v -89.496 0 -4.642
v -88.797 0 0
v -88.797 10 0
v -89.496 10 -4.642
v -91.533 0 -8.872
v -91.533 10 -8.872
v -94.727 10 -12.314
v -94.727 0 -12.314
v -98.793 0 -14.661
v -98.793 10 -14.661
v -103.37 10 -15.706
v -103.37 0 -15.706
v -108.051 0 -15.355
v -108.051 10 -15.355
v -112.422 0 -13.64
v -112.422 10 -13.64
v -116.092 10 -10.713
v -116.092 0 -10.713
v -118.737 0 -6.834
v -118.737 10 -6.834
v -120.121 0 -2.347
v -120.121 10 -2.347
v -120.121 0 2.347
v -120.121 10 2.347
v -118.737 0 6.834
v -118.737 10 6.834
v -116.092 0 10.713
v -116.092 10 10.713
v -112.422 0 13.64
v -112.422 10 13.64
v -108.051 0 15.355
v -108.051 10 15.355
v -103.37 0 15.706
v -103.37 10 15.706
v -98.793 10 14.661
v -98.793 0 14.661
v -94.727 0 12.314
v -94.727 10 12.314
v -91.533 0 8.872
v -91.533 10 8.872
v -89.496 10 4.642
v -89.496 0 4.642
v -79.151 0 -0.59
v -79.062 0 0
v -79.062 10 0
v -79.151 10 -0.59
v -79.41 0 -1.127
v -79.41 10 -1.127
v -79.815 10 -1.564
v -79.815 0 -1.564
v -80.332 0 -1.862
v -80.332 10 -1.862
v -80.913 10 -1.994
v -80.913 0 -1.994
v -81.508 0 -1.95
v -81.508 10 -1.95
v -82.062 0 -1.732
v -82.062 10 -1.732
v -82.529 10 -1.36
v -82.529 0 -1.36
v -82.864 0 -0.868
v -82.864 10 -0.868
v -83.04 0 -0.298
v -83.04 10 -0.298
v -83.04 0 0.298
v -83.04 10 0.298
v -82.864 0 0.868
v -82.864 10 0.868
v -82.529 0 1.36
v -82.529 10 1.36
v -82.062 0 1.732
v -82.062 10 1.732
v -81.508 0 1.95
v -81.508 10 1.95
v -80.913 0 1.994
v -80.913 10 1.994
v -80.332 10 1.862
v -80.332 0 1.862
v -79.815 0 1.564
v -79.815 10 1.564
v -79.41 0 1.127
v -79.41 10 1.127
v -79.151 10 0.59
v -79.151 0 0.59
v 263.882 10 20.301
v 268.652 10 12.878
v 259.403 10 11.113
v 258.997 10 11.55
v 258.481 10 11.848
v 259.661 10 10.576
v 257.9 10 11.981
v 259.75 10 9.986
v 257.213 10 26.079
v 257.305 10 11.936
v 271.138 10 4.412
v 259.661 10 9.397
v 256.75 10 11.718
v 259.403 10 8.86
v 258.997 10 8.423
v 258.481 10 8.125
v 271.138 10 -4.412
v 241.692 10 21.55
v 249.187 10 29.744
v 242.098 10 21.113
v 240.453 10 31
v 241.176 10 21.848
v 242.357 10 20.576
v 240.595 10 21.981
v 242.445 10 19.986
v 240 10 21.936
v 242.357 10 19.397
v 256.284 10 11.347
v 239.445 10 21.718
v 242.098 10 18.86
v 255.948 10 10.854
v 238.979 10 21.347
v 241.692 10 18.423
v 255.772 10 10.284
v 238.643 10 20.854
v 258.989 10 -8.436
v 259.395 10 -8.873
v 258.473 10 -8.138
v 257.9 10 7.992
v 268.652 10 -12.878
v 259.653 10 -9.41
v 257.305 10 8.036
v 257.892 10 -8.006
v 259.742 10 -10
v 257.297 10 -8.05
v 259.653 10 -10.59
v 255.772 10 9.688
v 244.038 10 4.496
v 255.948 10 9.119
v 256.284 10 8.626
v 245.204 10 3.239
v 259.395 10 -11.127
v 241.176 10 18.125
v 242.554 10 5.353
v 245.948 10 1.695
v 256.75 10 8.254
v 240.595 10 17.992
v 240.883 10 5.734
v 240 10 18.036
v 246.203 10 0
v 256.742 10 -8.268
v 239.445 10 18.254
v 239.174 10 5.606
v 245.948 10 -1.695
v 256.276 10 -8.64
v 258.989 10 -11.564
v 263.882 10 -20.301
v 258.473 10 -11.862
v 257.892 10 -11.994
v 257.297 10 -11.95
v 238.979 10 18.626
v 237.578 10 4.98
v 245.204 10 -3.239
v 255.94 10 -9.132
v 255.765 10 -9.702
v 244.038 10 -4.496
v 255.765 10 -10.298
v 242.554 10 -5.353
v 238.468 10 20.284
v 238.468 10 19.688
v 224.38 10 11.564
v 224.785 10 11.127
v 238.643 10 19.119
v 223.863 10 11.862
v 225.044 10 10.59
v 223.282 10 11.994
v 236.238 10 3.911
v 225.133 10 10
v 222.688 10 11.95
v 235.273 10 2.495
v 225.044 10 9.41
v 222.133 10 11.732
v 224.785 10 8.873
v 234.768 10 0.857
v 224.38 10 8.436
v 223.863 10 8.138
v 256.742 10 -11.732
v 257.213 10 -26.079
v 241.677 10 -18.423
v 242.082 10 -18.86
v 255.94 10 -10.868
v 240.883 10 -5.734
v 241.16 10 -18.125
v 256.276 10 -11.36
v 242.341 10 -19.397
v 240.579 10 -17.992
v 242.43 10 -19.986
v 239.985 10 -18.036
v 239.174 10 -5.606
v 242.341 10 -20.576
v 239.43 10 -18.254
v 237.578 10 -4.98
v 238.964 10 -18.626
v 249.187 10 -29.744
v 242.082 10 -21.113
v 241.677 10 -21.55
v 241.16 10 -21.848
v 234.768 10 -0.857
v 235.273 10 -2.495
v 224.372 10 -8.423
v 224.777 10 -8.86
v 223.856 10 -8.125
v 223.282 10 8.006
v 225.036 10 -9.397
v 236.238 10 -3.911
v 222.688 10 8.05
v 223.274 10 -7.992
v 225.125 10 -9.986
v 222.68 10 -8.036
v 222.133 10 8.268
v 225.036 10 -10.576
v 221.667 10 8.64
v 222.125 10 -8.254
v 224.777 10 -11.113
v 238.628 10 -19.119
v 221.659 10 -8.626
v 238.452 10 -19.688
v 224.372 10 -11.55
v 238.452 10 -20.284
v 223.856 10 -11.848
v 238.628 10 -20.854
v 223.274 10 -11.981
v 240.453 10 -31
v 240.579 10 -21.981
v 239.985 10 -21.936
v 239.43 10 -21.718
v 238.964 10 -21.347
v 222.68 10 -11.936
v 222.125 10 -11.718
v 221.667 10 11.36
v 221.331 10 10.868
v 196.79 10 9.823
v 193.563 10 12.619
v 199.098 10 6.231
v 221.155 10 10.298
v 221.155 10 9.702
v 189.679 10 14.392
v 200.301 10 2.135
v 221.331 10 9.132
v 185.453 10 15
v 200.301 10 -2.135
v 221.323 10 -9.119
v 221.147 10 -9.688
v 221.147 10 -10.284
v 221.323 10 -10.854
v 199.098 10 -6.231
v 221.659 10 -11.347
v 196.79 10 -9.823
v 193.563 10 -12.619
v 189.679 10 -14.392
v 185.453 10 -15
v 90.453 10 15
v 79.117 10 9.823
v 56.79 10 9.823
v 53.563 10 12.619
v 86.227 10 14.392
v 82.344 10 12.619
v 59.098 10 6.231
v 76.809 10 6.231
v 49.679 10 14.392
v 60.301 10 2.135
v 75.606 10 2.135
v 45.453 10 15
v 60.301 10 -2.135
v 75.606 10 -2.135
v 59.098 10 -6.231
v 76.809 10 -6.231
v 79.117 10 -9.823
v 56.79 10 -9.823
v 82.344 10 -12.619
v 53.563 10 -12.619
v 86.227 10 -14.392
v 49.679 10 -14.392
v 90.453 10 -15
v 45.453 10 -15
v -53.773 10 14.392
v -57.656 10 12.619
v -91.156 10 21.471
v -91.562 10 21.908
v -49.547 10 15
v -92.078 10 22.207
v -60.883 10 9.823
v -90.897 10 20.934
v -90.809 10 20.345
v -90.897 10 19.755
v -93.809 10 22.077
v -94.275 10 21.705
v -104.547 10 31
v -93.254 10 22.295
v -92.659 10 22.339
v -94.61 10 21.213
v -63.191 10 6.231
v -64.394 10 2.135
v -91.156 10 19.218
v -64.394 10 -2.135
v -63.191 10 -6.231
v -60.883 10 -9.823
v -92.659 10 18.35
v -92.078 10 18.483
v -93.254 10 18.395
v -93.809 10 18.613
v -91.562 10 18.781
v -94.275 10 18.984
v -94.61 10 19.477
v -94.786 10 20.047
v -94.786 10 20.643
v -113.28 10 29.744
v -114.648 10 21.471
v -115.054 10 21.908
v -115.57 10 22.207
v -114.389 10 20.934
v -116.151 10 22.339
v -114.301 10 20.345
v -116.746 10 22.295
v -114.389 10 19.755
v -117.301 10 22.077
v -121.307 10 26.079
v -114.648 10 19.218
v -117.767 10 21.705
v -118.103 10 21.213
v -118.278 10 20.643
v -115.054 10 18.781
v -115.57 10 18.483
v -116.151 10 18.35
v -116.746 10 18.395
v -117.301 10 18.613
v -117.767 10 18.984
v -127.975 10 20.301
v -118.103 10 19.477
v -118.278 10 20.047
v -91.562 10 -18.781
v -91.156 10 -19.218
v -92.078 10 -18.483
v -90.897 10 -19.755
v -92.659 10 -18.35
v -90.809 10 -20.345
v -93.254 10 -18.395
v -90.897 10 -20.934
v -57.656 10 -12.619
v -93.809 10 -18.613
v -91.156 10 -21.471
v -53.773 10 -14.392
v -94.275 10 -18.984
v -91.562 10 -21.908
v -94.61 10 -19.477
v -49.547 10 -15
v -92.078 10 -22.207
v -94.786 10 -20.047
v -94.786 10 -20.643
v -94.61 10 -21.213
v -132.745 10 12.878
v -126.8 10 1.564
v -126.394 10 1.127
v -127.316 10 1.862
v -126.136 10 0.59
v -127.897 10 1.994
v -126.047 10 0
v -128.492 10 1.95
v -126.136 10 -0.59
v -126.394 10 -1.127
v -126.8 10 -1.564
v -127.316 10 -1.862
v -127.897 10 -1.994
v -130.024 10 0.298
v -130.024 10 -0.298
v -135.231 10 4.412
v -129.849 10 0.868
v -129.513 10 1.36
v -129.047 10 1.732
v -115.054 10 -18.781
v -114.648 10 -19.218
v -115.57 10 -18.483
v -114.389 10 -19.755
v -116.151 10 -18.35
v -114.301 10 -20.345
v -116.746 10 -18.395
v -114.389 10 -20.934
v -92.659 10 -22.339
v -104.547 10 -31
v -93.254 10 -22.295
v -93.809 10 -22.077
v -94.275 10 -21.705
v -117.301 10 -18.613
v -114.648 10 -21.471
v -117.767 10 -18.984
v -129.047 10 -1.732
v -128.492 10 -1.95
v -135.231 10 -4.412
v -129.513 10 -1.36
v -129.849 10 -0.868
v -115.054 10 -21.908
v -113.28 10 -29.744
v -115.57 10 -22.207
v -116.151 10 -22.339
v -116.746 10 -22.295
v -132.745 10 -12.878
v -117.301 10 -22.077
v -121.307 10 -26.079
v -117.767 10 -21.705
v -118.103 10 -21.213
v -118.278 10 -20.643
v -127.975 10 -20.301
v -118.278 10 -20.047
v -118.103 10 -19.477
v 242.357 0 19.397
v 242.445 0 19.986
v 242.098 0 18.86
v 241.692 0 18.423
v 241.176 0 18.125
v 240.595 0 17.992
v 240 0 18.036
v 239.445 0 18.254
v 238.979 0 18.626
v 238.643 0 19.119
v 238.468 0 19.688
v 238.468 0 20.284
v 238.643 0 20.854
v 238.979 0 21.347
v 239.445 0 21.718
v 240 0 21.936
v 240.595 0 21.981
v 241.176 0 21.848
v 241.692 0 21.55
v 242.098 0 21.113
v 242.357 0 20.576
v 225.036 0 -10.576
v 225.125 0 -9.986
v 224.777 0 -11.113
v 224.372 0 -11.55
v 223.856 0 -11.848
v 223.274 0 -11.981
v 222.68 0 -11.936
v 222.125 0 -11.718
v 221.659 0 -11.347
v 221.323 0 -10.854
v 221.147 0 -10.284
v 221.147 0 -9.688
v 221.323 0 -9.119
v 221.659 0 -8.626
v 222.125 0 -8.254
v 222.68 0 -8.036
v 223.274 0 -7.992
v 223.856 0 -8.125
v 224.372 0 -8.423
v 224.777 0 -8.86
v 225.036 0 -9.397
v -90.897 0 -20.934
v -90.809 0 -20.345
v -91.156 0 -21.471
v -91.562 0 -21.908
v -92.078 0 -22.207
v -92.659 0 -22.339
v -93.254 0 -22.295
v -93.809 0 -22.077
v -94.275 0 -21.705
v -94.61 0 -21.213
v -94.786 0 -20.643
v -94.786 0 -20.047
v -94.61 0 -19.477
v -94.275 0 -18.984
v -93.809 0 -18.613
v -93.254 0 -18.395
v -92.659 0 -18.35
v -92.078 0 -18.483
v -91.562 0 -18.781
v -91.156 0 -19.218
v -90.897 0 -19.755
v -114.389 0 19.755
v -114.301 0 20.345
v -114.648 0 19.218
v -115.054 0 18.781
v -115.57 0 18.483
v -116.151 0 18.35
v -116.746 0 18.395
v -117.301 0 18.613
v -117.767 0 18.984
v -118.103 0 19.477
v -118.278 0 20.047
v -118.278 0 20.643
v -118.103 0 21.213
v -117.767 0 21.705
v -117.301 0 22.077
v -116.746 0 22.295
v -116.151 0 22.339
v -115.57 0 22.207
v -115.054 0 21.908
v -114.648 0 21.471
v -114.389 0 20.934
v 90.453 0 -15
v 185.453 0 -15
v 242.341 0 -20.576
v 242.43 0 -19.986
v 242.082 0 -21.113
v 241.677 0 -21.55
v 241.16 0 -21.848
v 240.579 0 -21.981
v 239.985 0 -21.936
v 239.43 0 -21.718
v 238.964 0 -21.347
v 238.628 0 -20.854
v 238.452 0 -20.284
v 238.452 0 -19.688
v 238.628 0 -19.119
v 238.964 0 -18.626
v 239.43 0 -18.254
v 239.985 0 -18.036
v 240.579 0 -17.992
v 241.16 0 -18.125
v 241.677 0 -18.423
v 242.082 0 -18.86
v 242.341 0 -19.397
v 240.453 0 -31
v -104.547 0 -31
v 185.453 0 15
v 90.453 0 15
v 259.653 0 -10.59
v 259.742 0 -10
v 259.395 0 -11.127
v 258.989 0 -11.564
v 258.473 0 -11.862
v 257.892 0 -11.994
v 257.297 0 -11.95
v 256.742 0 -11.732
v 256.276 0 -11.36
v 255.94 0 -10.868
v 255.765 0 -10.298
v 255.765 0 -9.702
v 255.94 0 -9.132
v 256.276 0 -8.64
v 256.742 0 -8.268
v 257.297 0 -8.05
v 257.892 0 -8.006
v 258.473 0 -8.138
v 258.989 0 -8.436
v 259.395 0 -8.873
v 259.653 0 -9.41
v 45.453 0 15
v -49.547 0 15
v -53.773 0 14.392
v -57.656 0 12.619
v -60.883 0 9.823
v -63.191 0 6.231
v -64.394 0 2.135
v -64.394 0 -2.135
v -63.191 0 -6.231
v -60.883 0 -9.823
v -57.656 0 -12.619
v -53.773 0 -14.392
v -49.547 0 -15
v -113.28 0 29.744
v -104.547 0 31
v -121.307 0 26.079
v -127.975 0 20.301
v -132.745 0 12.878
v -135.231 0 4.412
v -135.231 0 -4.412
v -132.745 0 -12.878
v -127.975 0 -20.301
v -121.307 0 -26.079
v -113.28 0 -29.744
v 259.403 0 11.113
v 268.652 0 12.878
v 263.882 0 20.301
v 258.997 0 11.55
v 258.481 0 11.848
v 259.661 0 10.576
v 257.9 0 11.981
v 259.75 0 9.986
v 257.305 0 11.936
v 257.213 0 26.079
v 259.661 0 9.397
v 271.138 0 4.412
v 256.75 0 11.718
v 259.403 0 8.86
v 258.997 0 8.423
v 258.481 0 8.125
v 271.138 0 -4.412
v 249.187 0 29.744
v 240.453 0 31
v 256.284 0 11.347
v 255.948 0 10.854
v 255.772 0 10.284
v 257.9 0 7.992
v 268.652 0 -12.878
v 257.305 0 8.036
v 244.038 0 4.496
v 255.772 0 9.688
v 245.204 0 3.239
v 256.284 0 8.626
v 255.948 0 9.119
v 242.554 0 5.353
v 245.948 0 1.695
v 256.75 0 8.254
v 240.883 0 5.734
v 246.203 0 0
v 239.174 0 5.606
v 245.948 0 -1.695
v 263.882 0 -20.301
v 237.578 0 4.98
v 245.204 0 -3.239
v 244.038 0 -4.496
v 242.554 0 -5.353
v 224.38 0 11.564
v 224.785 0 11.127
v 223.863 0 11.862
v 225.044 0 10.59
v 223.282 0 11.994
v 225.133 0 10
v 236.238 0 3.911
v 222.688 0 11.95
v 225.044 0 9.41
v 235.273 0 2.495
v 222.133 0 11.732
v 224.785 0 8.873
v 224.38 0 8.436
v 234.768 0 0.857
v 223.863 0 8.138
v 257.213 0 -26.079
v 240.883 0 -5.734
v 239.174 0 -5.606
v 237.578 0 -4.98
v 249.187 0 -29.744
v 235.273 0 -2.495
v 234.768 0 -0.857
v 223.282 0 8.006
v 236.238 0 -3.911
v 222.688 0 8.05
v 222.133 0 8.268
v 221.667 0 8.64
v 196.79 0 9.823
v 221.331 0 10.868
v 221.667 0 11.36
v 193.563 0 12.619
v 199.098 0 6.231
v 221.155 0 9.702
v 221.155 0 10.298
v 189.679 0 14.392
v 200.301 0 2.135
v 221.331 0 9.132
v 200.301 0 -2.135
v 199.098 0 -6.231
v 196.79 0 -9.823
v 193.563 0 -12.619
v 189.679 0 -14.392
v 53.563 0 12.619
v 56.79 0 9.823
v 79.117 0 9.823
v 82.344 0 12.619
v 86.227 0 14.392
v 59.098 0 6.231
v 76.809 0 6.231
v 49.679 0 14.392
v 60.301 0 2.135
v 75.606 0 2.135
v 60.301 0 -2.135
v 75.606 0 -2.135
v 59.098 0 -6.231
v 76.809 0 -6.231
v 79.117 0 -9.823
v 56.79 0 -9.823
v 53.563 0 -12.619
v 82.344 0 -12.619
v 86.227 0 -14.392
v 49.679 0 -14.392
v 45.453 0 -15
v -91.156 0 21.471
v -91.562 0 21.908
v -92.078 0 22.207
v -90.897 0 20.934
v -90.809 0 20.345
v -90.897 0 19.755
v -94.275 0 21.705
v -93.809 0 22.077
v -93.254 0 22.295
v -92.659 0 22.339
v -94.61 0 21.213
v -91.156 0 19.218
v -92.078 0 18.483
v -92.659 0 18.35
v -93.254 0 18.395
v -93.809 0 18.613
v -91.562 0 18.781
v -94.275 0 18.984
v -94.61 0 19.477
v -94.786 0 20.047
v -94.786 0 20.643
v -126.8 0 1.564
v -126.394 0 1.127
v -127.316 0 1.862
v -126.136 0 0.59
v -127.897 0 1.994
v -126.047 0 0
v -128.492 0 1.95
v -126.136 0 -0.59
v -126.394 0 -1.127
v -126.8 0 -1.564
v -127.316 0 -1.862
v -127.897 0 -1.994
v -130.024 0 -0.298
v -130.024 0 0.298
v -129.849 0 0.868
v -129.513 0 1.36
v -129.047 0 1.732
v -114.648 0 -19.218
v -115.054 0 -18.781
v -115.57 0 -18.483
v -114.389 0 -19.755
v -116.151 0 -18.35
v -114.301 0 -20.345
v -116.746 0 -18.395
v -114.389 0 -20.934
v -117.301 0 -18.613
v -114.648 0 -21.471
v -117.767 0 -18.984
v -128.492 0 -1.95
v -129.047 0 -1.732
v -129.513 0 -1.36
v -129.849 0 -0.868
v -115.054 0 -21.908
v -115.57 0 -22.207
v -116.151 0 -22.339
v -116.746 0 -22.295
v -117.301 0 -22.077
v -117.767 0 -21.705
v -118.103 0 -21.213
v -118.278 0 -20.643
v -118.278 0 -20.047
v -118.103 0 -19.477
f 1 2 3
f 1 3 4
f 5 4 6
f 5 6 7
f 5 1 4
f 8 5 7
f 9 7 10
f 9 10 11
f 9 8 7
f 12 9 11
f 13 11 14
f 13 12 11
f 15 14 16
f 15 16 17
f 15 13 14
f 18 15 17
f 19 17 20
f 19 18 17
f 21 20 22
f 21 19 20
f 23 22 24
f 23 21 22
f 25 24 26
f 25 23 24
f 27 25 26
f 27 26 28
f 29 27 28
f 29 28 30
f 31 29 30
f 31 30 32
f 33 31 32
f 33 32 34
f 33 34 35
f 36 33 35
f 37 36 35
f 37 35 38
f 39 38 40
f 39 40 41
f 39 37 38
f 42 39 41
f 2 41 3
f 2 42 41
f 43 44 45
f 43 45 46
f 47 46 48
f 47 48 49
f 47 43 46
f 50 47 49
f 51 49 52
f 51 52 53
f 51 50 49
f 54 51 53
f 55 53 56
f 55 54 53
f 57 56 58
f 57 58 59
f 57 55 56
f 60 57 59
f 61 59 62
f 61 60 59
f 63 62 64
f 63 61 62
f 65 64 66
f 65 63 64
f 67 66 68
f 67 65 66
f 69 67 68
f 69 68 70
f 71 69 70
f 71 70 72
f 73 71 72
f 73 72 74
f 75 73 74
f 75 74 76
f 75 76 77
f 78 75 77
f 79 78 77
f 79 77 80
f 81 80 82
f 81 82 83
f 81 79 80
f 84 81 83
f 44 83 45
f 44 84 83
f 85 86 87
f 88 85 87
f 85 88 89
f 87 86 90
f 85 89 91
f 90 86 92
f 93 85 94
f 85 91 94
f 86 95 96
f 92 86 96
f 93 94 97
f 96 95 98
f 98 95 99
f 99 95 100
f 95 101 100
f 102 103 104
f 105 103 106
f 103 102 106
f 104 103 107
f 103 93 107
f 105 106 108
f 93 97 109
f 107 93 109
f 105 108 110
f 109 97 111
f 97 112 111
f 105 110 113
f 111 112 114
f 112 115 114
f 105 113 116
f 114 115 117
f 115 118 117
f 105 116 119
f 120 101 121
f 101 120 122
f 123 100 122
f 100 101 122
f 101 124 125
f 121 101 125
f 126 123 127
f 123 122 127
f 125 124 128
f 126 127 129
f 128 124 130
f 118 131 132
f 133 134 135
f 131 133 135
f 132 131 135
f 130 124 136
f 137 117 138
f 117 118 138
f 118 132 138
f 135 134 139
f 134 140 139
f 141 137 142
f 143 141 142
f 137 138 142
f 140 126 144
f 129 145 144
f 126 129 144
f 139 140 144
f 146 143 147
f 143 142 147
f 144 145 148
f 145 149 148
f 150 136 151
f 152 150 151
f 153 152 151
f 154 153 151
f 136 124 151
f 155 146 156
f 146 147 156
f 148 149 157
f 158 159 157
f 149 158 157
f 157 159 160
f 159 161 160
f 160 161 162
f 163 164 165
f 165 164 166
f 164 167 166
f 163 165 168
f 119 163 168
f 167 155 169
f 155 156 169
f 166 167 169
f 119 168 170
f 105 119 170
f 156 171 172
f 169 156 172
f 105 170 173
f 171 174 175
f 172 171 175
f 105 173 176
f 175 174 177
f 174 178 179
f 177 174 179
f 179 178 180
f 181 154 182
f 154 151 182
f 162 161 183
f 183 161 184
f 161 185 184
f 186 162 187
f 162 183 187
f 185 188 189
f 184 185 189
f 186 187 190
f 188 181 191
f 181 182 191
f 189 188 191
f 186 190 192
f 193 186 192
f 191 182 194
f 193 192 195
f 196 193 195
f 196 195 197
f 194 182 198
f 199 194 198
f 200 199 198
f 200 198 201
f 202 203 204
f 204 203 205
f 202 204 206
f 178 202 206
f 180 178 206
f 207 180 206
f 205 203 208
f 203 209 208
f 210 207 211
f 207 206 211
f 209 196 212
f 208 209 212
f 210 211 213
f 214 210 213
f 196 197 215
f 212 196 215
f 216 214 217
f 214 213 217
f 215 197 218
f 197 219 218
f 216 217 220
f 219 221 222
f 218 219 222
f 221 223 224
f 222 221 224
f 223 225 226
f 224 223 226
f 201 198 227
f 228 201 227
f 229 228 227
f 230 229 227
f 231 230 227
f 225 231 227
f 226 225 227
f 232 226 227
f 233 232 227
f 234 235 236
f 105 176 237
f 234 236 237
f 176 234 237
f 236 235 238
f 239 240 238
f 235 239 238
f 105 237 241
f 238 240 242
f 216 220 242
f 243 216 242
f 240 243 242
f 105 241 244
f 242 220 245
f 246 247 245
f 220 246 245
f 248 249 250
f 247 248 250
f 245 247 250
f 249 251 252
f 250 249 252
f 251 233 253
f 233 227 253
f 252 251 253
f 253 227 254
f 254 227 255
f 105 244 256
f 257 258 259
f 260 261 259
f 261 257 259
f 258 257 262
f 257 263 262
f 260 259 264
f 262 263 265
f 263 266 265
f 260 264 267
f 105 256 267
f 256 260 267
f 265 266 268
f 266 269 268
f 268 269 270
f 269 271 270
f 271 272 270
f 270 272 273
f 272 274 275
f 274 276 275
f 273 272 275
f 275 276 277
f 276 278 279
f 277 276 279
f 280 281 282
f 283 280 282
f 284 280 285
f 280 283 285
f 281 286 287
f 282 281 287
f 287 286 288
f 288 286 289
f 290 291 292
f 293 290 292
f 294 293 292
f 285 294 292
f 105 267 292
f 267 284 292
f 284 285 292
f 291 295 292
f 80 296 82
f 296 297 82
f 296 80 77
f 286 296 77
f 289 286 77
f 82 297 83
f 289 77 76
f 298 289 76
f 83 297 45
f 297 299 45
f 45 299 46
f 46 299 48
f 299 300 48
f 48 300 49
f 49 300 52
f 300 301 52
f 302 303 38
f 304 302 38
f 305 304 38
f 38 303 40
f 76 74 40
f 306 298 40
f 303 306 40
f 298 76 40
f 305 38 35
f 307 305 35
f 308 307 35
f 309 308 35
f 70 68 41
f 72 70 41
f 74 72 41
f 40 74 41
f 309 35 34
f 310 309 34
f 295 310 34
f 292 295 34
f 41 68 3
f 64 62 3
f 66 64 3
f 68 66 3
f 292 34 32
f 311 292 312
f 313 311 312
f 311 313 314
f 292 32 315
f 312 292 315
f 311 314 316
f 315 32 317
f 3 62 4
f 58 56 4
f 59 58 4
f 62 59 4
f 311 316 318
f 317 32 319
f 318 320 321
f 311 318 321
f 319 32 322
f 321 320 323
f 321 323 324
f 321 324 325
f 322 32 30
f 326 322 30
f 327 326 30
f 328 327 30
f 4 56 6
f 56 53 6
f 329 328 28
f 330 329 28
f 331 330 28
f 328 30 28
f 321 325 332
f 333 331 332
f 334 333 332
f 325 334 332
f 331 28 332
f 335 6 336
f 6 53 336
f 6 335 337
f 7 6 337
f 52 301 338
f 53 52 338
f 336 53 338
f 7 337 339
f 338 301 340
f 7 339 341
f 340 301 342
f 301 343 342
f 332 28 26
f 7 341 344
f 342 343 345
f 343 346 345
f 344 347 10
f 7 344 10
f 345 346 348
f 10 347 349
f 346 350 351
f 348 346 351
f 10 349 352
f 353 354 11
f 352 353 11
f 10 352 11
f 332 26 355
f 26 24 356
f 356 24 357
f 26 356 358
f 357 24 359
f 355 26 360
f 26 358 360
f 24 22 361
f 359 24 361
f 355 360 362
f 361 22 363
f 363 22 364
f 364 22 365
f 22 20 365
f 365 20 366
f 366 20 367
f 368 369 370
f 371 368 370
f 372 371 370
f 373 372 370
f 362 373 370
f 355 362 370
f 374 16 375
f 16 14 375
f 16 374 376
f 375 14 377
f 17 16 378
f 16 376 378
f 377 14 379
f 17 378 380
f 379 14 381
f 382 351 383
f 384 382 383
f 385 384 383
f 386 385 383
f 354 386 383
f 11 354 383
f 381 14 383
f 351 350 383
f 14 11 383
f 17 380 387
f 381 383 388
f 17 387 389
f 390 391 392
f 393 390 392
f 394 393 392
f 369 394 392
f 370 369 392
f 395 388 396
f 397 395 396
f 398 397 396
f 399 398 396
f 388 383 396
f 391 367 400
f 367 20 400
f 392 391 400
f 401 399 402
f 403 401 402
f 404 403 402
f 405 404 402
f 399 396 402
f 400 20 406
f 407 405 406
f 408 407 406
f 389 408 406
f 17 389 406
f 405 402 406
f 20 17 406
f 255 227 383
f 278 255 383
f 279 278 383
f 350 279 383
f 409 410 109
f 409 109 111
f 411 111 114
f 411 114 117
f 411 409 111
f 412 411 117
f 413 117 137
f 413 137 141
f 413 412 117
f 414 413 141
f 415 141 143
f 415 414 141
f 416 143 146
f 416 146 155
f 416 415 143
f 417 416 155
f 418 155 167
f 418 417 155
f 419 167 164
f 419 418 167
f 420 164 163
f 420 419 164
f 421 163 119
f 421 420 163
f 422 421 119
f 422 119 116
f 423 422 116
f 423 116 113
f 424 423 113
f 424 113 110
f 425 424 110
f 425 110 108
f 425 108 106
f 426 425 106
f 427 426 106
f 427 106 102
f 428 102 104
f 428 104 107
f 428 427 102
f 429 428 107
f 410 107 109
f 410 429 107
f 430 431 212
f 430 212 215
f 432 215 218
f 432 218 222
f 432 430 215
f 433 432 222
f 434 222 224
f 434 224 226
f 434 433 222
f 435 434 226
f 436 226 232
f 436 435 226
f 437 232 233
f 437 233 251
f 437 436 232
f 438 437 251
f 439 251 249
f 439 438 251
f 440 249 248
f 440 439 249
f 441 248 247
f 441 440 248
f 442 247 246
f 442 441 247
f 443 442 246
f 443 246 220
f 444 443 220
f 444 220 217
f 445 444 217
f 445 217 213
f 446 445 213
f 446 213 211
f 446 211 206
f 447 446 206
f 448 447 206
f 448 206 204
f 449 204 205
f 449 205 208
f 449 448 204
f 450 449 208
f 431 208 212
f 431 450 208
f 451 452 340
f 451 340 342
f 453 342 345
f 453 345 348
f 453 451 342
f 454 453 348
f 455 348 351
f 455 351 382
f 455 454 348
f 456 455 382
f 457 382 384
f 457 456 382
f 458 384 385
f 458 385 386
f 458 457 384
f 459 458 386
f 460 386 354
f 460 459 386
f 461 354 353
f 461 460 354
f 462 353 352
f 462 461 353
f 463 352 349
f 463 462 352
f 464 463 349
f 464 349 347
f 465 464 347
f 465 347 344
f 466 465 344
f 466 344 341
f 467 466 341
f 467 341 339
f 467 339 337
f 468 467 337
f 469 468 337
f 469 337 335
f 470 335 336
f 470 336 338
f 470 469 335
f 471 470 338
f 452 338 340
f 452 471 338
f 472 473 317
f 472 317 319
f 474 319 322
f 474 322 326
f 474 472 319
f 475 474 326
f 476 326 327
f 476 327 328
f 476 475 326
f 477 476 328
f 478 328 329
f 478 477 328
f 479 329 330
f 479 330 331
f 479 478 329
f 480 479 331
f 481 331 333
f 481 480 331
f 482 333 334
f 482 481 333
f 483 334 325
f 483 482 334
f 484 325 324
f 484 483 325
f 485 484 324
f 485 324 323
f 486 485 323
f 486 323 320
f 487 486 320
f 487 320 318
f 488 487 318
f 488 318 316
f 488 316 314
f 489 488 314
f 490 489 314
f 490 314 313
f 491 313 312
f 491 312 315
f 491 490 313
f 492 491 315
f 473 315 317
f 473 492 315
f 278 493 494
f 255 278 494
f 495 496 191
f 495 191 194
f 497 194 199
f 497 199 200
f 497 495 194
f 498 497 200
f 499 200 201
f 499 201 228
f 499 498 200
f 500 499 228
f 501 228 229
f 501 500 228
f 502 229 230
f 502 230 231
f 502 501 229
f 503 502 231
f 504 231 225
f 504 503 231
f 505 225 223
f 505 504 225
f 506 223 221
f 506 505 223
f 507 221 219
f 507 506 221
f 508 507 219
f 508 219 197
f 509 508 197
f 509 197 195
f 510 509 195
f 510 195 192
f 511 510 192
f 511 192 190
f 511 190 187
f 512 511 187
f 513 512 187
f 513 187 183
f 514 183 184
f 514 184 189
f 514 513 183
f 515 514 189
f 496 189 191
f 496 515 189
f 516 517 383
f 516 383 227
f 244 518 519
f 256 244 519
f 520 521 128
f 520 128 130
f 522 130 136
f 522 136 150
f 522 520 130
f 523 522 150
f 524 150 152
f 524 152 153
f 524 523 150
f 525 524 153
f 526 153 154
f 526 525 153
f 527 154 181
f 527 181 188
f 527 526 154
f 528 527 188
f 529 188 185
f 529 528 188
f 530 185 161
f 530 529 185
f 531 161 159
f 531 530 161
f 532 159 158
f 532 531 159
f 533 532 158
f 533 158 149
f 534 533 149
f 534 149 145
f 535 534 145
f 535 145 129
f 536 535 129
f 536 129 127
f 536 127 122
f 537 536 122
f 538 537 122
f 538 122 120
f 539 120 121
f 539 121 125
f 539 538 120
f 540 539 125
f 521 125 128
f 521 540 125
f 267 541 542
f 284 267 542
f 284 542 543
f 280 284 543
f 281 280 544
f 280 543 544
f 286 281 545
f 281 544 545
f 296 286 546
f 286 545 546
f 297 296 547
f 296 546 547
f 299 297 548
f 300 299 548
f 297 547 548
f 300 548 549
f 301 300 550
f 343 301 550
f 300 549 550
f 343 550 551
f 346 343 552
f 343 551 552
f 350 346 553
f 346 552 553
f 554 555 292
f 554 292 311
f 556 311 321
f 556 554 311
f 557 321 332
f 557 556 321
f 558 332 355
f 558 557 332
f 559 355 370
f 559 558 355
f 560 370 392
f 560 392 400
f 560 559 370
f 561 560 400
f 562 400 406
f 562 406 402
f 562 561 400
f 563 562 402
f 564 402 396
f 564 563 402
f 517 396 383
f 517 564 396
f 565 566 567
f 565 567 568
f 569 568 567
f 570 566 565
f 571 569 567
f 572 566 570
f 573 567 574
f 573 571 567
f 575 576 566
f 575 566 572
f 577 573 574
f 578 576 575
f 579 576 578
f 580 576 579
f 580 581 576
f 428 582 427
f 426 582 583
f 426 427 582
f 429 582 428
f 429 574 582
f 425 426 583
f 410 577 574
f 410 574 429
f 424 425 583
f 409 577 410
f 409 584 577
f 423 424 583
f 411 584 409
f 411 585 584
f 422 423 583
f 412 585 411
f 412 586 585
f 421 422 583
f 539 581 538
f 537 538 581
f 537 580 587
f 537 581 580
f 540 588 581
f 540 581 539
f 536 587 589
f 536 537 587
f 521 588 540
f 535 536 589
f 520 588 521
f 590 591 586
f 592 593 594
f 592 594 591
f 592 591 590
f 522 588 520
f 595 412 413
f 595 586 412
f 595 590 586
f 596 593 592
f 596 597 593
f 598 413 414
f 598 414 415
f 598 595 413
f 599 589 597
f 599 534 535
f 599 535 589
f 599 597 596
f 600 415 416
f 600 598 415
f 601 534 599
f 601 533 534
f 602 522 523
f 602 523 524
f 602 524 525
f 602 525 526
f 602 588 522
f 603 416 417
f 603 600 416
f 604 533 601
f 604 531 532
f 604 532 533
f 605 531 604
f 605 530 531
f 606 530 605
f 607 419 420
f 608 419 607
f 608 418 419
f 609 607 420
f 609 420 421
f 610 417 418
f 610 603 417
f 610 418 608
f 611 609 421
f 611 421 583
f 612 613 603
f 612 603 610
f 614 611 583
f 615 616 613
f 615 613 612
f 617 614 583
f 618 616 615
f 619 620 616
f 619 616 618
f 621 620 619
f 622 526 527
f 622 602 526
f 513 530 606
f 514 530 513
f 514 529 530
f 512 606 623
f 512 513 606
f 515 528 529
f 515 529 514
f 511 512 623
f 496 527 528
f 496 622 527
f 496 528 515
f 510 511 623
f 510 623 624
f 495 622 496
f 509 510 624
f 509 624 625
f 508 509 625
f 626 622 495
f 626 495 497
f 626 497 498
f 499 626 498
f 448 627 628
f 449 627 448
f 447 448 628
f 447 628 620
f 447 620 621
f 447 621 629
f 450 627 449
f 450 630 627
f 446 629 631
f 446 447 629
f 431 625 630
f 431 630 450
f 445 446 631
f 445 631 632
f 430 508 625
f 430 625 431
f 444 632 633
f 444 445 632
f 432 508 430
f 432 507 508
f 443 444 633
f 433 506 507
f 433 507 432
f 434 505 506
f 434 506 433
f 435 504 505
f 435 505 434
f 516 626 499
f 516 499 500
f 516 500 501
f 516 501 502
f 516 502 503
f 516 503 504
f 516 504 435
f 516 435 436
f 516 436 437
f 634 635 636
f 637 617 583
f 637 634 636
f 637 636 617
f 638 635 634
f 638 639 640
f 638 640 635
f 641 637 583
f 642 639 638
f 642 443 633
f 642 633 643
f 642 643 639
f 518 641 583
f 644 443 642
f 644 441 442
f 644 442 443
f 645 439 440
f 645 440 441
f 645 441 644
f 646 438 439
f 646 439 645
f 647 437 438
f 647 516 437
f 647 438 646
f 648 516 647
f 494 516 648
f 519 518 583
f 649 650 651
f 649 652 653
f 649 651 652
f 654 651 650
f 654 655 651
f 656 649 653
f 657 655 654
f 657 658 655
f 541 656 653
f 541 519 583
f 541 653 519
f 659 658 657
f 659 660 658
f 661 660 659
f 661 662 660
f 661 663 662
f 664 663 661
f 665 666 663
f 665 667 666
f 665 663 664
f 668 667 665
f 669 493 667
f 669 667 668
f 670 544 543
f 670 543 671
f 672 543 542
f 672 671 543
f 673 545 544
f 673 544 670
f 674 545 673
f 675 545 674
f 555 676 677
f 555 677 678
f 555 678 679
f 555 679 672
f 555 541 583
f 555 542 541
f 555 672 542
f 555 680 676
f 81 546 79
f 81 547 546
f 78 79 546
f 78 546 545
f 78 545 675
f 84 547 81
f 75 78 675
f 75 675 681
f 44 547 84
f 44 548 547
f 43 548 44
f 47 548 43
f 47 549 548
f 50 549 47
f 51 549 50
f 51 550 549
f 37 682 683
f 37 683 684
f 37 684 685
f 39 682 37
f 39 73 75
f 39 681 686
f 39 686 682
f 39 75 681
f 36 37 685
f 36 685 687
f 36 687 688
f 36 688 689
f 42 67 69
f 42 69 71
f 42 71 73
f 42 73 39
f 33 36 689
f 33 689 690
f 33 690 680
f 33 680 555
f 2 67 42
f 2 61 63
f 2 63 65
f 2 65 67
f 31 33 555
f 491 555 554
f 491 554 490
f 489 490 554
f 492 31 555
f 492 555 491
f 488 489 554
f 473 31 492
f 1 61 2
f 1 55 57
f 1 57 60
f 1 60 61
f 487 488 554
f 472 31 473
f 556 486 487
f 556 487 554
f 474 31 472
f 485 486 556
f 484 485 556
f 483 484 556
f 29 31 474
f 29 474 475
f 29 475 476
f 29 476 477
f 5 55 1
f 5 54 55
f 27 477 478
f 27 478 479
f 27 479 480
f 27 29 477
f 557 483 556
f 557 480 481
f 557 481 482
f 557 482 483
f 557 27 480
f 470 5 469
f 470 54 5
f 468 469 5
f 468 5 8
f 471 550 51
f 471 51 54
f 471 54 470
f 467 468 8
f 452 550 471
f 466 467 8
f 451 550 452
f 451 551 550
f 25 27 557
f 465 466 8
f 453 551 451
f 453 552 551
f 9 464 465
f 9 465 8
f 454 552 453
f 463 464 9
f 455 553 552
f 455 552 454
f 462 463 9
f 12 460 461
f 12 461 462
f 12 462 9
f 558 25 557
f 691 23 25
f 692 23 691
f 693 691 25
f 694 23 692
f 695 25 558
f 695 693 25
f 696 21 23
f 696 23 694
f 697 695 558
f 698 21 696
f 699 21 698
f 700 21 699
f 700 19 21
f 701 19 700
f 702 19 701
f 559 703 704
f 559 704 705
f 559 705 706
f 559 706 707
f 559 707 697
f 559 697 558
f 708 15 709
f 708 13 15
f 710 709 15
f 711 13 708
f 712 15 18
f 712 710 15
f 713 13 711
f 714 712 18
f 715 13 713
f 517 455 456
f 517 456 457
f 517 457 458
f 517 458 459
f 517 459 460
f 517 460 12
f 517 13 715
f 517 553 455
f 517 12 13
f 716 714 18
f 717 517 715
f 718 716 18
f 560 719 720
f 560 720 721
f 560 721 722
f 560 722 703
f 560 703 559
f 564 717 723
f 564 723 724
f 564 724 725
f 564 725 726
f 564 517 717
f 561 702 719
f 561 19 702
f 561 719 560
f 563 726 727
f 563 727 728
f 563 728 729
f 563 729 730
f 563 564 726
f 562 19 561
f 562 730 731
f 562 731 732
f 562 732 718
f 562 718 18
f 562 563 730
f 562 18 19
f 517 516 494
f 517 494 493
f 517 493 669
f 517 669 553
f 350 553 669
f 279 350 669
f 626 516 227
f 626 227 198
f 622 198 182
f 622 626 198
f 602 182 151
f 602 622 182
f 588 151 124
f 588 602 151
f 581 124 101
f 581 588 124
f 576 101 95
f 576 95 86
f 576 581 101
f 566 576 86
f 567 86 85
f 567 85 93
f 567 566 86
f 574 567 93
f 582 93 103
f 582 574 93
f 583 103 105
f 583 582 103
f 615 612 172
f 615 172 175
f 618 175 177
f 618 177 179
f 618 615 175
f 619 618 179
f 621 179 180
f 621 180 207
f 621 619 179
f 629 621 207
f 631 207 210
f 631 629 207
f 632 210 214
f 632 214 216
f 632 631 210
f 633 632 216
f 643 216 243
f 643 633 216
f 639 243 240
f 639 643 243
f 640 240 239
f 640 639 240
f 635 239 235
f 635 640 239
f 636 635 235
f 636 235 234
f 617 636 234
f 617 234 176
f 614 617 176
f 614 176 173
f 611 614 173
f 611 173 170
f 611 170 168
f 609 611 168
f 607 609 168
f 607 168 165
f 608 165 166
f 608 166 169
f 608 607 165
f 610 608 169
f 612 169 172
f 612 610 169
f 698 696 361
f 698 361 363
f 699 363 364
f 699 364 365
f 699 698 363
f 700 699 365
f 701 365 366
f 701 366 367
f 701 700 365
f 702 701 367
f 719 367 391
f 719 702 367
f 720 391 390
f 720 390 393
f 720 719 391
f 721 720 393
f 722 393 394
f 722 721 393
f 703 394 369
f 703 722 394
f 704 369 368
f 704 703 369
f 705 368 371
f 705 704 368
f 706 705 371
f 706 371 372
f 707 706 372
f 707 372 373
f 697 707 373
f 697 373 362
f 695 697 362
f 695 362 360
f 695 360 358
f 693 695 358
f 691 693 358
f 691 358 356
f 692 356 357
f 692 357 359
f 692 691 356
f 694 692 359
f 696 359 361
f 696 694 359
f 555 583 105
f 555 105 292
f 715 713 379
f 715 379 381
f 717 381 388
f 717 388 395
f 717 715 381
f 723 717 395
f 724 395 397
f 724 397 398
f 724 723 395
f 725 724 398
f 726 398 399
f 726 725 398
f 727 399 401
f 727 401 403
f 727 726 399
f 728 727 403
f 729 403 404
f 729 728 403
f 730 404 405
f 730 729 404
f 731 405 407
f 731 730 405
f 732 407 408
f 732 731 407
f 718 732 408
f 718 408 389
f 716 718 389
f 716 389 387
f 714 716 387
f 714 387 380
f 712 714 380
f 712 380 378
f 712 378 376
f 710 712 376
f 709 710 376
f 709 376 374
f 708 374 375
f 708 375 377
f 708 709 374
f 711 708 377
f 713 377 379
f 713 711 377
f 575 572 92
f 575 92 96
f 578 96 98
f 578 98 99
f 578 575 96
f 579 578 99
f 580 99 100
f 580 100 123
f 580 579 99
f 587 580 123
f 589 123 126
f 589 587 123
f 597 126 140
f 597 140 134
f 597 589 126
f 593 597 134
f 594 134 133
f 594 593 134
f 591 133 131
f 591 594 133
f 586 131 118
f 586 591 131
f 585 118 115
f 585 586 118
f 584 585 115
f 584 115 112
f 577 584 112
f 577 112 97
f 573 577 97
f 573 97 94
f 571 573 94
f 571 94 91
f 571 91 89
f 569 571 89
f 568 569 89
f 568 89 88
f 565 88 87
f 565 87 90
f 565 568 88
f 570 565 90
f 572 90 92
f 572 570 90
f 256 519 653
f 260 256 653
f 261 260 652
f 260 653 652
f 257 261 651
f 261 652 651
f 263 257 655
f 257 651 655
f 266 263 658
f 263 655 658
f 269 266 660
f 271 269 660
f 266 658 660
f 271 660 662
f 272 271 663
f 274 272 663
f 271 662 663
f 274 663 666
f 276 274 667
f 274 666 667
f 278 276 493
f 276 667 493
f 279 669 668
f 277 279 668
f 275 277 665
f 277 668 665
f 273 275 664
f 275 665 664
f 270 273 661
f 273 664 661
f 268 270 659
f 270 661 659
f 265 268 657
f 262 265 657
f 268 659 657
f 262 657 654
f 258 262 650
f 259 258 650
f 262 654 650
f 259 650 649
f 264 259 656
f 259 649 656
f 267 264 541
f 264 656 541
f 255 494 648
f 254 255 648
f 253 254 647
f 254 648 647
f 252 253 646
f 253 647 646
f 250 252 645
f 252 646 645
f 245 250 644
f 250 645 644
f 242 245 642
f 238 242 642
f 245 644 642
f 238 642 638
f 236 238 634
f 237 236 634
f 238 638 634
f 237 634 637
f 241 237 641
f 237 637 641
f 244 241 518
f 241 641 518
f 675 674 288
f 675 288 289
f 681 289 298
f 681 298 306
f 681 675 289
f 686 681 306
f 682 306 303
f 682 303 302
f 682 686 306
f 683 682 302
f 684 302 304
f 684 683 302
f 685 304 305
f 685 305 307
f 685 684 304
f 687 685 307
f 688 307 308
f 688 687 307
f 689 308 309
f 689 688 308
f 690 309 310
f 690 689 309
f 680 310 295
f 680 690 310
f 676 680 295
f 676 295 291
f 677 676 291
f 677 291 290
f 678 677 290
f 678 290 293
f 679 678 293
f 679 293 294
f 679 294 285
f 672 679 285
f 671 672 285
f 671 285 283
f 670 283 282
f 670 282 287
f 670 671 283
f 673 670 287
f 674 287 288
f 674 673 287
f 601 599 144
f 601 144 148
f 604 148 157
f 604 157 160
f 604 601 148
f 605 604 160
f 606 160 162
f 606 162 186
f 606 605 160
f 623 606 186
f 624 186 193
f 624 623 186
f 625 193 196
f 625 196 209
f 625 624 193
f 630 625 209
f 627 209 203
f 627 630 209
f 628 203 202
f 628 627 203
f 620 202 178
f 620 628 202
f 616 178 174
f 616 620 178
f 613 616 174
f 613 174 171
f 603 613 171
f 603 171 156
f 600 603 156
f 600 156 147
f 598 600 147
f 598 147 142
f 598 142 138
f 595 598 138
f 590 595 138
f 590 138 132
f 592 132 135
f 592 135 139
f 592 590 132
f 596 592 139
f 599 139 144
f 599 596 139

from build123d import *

# Parameters (mm, degrees)
SKETCH1_R           = 5.75
SKETCH1_R_2         = 15.75
SKETCH1_R_3         = 2
BOSS_EXTRUDE1_DEPTH = 10


with BuildPart() as part:
    # Sketch1 → Boss-Extrude1 (new body)
    with BuildSketch(Plane(origin=(0, 0, 0), x_dir=(1, 0, 0), z_dir=(0, 1, 0))):
        with BuildLine():
            Line((-104.546683395, 31), (240.453316605, 31))
            ThreePointArc((240.453316605, 31), (271.453316605, 0), (240.453316605, -31))
            Line((240.453316605, -31), (-104.546683395, -31))
            ThreePointArc((-104.546683395, -31), (-135.546683395, 0), (-104.546683395, 31))
        make_face()
        with Locations((240.453316605, 0)):
            Circle(SKETCH1_R, mode=Mode.SUBTRACT)
        with Locations((-104.546683395, 0)):
            Circle(SKETCH1_R_2, mode=Mode.SUBTRACT)
        with Locations((223.132808529, -10)):
            Circle(SKETCH1_R_3, mode=Mode.SUBTRACT)
        with Locations((223.124915417, 9.986328729)):
            Circle(SKETCH1_R_3, mode=Mode.SUBTRACT)
        with Locations((240.429637268, 19.986328729)):
            Circle(SKETCH1_R_3, mode=Mode.SUBTRACT)
        with Locations((257.742252232, 10)):
            Circle(SKETCH1_R_3, mode=Mode.SUBTRACT)
        with Locations((257.750145344, -9.986328729)):
            Circle(SKETCH1_R_3, mode=Mode.SUBTRACT)
        with Locations((240.445423493, -19.986328729)):
            Circle(SKETCH1_R_3, mode=Mode.SUBTRACT)
        with Locations((-128.046683395, 0)):
            Circle(SKETCH1_R_3, mode=Mode.SUBTRACT)
        with Locations((-116.300629951, 20.344761353)):
            Circle(SKETCH1_R_3, mode=Mode.SUBTRACT)
        with Locations((-92.808523063, 20.344761353)):
            Circle(SKETCH1_R_3, mode=Mode.SUBTRACT)
        with Locations((-81.062469619, 0)):
            Circle(SKETCH1_R_3, mode=Mode.SUBTRACT)
        with Locations((-92.808523063, -20.344761353)):
            Circle(SKETCH1_R_3, mode=Mode.SUBTRACT)
        with Locations((-116.300629951, -20.344761353)):
            Circle(SKETCH1_R_3, mode=Mode.SUBTRACT)
        with BuildLine():
            Line((-49.546683395, 15), (45.453316605, 15))
            ThreePointArc((45.453316605, 15), (60.453316605, 0), (45.453316605, -15))
            Line((45.453316605, -15), (-49.546683395, -15))
            ThreePointArc((-49.546683395, -15), (-64.546683395, 0), (-49.546683395, 15))
        make_face(mode=Mode.SUBTRACT)
        with BuildLine():
            Line((90.453316605, 15), (185.453316605, 15))
            ThreePointArc((185.453316605, 15), (200.453316605, 0), (185.453316605, -15))
            Line((185.453316605, -15), (90.453316605, -15))
            ThreePointArc((90.453316605, -15), (75.453316605, 0), (90.453316605, 15))
        make_face(mode=Mode.SUBTRACT)
    extrude(amount=BOSS_EXTRUDE1_DEPTH)


solid = part.part
